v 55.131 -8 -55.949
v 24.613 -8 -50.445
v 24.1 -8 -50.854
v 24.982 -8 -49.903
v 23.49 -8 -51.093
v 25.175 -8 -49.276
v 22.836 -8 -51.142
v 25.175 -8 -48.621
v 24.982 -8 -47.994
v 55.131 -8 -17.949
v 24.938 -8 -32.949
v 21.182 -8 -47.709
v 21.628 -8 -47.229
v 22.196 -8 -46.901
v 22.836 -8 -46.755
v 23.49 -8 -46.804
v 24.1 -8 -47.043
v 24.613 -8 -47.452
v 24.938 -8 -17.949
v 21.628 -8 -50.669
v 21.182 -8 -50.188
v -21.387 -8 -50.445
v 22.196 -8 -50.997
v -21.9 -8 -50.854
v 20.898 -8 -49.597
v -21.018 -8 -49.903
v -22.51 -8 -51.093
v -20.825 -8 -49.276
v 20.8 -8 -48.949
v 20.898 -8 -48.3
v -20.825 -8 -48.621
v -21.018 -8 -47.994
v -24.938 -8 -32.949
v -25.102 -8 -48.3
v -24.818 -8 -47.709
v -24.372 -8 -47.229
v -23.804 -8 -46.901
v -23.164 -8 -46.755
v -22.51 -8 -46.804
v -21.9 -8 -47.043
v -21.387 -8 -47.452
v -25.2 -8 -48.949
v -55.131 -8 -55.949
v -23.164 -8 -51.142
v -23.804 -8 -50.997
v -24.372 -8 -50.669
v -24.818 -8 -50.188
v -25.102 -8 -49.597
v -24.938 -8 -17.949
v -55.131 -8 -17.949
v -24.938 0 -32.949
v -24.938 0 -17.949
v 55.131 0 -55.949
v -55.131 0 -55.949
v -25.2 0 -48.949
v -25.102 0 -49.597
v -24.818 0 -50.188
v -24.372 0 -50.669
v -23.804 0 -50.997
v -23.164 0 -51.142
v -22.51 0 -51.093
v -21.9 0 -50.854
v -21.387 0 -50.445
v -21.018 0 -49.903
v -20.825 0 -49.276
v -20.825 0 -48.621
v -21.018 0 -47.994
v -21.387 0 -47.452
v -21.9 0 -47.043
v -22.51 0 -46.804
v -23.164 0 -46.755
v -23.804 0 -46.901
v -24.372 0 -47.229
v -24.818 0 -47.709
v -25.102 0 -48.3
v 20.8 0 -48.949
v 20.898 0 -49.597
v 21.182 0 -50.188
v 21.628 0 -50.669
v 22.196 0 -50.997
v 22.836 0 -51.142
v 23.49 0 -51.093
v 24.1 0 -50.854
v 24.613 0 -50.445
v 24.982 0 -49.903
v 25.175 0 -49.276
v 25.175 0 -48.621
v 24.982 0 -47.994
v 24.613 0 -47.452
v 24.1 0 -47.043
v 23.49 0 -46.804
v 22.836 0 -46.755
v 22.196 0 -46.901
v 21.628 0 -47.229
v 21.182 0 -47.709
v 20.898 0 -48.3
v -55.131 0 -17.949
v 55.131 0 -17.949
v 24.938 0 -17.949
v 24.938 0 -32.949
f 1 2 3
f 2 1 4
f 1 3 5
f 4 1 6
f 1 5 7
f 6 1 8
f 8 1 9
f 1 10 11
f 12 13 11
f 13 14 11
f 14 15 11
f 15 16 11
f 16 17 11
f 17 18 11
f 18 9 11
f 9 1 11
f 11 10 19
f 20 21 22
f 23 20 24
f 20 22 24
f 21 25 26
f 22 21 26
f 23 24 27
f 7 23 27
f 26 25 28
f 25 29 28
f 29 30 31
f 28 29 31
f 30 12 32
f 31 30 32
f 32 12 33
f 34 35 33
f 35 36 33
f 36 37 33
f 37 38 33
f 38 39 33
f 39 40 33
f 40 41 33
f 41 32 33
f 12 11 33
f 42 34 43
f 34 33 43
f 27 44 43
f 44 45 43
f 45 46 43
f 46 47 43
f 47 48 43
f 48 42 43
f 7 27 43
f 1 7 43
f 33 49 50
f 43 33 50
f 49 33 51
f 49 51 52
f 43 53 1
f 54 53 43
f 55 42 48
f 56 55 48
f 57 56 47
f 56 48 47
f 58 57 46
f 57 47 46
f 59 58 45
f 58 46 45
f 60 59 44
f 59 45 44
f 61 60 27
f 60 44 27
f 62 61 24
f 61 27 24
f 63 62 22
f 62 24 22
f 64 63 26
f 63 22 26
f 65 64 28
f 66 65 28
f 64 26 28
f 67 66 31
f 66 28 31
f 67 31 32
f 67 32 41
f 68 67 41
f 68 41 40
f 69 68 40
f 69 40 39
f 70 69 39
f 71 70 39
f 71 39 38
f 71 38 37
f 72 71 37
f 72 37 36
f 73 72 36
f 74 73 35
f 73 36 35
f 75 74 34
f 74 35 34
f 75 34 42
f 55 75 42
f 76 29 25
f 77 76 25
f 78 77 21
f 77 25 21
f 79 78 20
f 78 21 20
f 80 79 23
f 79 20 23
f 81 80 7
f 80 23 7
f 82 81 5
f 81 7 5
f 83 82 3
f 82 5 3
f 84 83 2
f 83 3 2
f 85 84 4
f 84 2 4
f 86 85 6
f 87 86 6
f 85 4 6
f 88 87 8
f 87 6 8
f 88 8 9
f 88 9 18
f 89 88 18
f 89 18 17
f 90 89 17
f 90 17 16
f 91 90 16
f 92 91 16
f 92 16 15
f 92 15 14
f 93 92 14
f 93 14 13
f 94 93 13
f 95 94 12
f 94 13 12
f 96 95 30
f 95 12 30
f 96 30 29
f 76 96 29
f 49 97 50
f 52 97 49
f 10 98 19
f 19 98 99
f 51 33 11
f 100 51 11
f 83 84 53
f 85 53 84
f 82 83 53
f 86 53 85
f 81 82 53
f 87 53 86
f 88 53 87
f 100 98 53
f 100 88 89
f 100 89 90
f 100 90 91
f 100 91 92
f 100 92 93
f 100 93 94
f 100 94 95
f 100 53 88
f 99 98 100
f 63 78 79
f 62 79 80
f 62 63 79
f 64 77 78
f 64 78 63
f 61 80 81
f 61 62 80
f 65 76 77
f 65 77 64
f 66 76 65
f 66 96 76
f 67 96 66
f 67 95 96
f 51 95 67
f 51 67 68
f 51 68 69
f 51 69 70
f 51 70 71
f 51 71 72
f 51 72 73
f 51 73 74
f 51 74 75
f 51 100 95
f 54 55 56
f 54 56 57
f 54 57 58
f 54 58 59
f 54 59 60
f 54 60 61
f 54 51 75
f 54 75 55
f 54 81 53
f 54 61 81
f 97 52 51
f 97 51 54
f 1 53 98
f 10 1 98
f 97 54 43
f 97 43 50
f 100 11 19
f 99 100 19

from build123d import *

# Parameters (mm, degrees)
F0_W     = 110
F0_H     = 38
F1_DEPTH = 8
F2_W     = 50
F2_H     = 15
F3_DEPTH = 25
F4_D     = 4.4


with BuildPart() as f1:
    # F0 (on Front) → F1 (new body)
    with BuildSketch(Plane.XZ):
        with Locations((-0.1309809089, -36.948600173)):
            Rectangle(F0_W, F0_H)
    extrude(amount=F1_DEPTH)

    # F2 (on face) → F3 (cut)
    with BuildSketch(Plane.XZ.offset(8)):
        with Locations((-0.0620441511, -25.448600173)):
            Rectangle(F2_W, F2_H)
    extrude(amount=-F3_DEPTH, mode=Mode.SUBTRACT)

    # F4 (through all)
    with Locations(Plane(origin=(0, 0, 0), x_dir=(1, 0, 0), z_dir=(0, 1, 0))):
        with Locations((-23, 48.948600173), (23, 48.948600173)):
            Hole(F4_D / 2)

    # F5: F1 across plane


with BuildPart() as f1_1:
    add(f1.part)
    add(f1.part.mirror(Plane.YZ))


solid = f1_1.part
